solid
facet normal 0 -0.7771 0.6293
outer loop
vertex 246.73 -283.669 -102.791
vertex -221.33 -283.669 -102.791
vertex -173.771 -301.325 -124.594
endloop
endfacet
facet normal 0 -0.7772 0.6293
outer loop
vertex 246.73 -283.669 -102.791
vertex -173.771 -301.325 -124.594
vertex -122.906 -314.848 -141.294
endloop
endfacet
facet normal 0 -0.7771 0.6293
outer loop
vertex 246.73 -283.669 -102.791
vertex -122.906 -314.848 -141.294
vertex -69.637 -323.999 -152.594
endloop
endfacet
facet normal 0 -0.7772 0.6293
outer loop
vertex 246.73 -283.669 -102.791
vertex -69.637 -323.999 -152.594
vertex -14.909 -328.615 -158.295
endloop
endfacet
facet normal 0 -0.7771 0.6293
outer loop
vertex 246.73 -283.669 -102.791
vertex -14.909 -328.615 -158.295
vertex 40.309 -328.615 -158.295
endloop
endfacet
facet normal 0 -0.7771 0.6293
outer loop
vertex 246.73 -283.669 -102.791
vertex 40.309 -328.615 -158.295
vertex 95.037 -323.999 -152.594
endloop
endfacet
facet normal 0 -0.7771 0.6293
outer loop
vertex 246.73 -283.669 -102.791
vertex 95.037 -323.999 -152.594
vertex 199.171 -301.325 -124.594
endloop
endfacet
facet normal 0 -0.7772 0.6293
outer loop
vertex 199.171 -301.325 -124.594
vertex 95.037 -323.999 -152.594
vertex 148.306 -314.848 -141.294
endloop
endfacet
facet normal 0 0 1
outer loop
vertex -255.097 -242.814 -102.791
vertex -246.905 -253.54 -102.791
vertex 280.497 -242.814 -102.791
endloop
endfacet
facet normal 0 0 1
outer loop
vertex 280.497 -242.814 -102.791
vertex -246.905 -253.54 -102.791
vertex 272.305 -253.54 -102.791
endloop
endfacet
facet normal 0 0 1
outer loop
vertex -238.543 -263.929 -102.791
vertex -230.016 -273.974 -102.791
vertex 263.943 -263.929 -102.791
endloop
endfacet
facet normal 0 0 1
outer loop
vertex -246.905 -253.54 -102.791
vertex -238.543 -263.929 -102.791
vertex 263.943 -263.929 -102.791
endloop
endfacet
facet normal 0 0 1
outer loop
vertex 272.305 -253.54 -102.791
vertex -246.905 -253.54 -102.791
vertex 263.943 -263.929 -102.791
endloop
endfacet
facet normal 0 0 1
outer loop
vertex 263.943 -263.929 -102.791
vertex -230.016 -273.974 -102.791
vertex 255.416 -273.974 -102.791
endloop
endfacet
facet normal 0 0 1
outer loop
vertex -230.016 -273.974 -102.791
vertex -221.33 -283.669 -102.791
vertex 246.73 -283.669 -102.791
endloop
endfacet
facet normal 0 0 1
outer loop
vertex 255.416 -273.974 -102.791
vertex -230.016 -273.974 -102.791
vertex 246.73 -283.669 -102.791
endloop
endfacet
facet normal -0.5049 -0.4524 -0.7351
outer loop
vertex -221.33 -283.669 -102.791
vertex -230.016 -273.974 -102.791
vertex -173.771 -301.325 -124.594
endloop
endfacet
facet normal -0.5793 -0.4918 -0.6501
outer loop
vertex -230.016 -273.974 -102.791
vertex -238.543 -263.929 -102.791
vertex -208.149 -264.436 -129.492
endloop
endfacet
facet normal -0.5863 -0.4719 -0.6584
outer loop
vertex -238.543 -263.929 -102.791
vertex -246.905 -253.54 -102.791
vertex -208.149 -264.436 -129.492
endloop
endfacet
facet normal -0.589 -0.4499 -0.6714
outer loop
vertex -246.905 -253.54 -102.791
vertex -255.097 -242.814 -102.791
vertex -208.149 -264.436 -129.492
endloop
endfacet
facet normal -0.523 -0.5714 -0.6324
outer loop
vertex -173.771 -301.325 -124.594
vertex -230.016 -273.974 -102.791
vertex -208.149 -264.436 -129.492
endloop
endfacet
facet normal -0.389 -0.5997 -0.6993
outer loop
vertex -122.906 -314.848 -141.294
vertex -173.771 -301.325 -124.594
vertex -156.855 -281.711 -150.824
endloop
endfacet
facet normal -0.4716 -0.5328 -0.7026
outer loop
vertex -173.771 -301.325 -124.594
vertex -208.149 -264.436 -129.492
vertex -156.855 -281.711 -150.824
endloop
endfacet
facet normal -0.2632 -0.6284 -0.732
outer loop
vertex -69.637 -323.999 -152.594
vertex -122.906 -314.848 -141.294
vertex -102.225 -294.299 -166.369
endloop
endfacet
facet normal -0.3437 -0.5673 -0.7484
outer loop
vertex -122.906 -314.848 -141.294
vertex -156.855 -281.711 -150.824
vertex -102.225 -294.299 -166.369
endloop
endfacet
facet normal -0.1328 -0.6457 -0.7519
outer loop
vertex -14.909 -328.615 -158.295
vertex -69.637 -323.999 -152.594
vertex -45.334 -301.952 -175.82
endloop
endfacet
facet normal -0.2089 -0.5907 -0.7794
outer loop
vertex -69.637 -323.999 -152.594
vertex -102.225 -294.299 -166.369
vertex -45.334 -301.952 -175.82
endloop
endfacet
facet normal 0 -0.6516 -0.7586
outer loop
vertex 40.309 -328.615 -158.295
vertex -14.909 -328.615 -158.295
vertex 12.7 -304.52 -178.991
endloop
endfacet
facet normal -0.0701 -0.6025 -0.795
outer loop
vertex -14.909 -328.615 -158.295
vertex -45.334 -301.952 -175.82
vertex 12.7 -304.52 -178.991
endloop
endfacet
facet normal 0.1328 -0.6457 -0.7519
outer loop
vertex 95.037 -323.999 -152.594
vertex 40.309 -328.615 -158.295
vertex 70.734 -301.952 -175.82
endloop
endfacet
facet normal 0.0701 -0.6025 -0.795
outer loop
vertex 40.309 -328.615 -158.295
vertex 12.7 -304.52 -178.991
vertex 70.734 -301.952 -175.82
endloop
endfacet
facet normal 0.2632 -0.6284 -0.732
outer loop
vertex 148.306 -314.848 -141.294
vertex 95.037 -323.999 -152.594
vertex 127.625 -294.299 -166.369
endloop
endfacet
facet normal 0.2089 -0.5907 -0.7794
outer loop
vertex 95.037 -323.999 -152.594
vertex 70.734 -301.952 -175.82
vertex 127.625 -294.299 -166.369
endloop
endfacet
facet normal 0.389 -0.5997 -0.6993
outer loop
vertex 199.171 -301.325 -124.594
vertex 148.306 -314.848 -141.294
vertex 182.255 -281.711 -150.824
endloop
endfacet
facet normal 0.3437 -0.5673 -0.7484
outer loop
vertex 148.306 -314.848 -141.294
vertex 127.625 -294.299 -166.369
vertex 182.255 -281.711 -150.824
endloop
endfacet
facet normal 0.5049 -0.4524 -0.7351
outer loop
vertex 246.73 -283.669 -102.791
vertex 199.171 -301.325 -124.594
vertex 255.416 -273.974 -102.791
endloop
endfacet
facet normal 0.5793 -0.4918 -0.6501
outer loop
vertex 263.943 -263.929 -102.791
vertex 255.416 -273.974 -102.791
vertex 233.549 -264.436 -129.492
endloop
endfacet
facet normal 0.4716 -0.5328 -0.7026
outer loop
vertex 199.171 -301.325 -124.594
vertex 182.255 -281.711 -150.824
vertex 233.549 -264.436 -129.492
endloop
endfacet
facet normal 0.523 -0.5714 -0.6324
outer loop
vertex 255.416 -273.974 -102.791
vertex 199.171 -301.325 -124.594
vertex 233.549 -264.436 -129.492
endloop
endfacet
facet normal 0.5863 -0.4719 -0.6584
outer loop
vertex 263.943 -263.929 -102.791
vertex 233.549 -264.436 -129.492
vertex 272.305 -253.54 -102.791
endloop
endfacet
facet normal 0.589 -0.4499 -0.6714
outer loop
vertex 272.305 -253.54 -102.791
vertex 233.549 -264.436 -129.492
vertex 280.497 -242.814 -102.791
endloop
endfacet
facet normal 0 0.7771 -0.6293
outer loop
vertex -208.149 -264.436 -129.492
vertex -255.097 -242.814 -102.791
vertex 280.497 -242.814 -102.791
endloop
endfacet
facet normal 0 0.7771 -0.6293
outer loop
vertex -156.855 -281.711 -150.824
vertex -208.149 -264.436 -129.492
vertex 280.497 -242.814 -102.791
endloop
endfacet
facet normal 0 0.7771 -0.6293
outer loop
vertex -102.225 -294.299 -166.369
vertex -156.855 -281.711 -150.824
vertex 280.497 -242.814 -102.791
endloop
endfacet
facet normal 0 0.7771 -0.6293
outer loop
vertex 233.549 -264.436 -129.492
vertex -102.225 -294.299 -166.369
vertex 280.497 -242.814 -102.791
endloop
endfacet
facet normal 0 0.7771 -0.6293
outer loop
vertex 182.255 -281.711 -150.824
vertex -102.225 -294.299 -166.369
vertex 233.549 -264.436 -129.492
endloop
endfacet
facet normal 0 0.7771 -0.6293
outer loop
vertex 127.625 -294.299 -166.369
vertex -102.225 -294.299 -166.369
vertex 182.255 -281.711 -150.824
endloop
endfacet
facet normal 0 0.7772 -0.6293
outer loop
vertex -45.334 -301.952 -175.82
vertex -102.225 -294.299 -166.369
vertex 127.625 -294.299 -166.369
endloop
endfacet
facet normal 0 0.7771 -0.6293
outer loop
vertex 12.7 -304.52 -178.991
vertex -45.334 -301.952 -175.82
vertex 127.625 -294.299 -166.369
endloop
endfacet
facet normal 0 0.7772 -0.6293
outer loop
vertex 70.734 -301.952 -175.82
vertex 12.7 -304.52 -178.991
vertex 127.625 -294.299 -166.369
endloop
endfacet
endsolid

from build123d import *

# Parameters (mm, degrees)
F1_DEPTH = 25.4
F3_DEPTH = 31.75
F5_DEPTH = 25.4
F6_W     = 25.4
F6_H     = 270.2104524793
F7_DEPTH = 508


with BuildPart() as f1:
    # F0 (on Right) → F1 (new body)
    with BuildSketch(Plane.YZ):
        Polygon((27.3959822953, -102.7910036798), (27.3959822953, 85.8886760547), (-43.5209119504, 143.3160446986), (-242.814470184, -102.7910036798), align=None)
    extrude(amount=F1_DEPTH)

    # F6 (on face) → F7 (cut)
    with BuildSketch(Plane(origin=(0, 0, -102.7910036798), x_dir=(1, 0, 0), z_dir=(0, 0, -1))):
        with Locations((12.7, 107.7092439444)):
            Rectangle(F6_W, F6_H)
    extrude(amount=-F7_DEPTH, mode=Mode.SUBTRACT)


with BuildPart() as f3:
    # F2 (on face) → F3 (new body)
    with BuildSketch(Plane(origin=(0, -96.3768318043, 78.044419565), x_dir=(1, 0, 0), z_dir=(0, -0.7771459615, 0.629320391))):
        with BuildLine():
            Line((0, -232.6917107126), (-255.0972491243, -232.6917107126))
            ThreePointArc((-255.0972491243, -232.6917107126), (12.7, -330.742311978), (280.4972491243, -232.6917107126))
            Line((280.4972491243, -232.6917107126), (25.4, -232.6917107126))
            Line((25.4, -232.6917107126), (12.7, -232.6917107126))
            Line((12.7, -232.6917107126), (0, -232.6917107126))
        make_face()
    extrude(amount=F3_DEPTH)

    # F4 (on face) → F5 (cut)
    with BuildSketch(Plane(origin=(0, 0, -102.7910036798), x_dir=(1, 0, 0), z_dir=(0, 0, -1))):
        Polygon((0, 242.814470184), (12.7, 242.814470184), (25.4, 242.814470184), (293.8941717148, 242.814470184), (293.8941717148, 285.4833602905), (-263.440400362, 285.4833602905), (-263.440400362, 242.814470184), align=None)
    extrude(amount=-F5_DEPTH, mode=Mode.SUBTRACT)


solid = f3.part
